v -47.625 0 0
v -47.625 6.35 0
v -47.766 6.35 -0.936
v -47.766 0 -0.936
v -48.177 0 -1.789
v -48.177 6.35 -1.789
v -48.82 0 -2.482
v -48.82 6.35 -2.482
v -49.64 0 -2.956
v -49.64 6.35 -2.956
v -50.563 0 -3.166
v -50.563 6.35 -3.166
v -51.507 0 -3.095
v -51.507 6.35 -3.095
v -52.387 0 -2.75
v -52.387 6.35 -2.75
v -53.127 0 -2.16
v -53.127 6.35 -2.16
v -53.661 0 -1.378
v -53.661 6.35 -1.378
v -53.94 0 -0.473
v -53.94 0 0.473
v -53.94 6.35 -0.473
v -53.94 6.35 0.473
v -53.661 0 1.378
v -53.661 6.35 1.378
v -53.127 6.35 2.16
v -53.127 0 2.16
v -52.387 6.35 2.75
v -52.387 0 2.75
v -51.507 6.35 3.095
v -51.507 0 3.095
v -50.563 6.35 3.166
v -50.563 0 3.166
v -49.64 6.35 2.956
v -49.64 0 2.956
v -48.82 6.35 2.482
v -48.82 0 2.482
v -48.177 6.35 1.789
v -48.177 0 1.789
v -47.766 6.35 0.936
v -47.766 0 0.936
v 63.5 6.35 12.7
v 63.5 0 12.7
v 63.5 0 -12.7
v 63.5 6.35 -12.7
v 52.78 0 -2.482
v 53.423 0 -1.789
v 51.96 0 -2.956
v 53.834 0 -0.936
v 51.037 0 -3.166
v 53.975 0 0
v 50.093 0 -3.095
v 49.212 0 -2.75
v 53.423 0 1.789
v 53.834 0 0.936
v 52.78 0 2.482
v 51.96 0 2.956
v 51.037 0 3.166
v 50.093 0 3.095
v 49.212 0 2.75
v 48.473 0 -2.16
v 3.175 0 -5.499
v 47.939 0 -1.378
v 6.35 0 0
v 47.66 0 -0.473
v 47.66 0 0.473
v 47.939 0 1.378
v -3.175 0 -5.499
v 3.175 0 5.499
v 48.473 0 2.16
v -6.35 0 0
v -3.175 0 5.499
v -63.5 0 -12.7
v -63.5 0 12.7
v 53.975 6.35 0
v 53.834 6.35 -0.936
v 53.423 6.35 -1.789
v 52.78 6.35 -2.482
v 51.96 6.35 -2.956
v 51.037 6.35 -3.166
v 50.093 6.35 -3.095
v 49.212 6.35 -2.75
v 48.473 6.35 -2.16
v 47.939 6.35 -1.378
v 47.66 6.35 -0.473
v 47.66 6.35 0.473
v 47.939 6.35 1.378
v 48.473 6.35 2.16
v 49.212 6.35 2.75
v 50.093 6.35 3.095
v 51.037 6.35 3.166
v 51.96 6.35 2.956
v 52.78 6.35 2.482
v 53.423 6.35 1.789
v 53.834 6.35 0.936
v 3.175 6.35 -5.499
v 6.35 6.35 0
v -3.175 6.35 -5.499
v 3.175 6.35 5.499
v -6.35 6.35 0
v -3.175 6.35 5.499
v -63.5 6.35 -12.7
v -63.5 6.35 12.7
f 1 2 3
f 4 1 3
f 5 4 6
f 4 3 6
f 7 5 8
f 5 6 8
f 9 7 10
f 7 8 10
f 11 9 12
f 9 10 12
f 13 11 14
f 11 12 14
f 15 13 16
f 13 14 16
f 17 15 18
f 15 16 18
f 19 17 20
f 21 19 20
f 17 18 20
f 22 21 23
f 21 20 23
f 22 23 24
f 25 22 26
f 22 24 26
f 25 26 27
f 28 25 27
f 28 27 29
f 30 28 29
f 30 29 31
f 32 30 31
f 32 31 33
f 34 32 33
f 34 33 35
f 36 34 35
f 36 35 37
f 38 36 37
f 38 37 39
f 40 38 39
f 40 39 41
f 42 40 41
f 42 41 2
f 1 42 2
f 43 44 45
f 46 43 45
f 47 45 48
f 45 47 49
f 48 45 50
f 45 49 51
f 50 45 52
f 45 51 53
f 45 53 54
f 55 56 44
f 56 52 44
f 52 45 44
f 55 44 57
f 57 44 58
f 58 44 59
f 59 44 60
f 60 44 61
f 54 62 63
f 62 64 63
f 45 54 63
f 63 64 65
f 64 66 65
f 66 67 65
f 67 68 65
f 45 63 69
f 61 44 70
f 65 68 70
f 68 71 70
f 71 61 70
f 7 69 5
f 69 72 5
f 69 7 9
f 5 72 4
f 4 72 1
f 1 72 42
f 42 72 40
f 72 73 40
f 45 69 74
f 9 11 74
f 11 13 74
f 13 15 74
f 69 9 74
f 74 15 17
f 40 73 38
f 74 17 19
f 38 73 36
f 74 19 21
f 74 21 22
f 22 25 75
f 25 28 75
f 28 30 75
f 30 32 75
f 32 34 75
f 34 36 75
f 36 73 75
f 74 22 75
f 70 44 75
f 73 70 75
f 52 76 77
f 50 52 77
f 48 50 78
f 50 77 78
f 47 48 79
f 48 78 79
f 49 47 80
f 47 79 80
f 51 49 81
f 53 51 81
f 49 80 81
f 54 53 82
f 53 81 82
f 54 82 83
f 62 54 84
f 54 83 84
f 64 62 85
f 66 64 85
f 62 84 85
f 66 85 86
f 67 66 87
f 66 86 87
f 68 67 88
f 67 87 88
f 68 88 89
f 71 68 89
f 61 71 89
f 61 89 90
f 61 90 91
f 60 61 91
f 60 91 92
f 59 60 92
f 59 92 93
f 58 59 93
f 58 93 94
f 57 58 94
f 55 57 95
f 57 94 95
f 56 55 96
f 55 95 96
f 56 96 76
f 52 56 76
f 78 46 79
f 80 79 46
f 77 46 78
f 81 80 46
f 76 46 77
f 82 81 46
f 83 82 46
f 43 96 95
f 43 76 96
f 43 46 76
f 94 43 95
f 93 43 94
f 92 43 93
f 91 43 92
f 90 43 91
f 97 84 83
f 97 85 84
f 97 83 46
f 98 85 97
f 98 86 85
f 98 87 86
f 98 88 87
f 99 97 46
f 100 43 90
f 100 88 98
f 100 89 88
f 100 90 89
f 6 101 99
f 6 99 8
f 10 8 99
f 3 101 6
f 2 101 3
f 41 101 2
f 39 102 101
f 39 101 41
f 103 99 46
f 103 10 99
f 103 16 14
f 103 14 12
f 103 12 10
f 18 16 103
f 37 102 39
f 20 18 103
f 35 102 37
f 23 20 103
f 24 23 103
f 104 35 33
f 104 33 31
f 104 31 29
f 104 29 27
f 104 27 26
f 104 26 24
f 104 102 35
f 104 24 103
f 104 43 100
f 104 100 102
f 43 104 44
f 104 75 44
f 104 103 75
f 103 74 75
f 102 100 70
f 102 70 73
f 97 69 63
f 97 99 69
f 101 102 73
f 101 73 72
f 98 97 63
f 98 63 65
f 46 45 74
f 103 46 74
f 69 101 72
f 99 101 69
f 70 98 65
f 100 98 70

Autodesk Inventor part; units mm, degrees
ref_plane "YZ Plane" through (0, 0, 0) normal (1, 0, 0) x (0, 1, 0)
ref_plane "XZ Plane" through (0, 0, 0) normal (0, 1, 0) x (-1, 0, 0)
ref_plane "XY Plane" through (0, 0, 0) normal (0, 0, 1) x (1, 0, 0)
sketch "Sketch1" plane through (0, 0, 0) normal (0, 1, 0) x (-1, 0, 0)
  line L0 (-63.5, -12.7) -> (63.5, -12.7)
  line L1 (63.5, -12.7) -> (63.5, 12.7)
  line L2 (63.5, 12.7) -> (-63.5, 12.7)
  line L3 (-63.5, 12.7) -> (-63.5, -12.7)
  line L4 (-63.5, -12.7) -> (63.5, 12.7) construction
  line L5 (63.5, -12.7) -> (-63.5, 12.7) construction
  point P0 (0, 0)
  dimension "d0" = 127
  dimension "d1" = 25.4
extrude "Extrusion1" add sketch "Sketch1" along normal blind 6.35
sketch "Sketch2" plane through (0, 6.35, 0) normal (0, 1, 0) x (1, 0, 0)
  line L0 (-63.5, 12.7) -> (-63.5, -12.7) projected
  line L1 (63.5, -12.7) -> (63.5, 12.7) projected
  line L2 (-63.5, 0) -> (-50.8, 0)
  line L3 (-63.5, 0) -> (-50.8, 0) construction
  line L4 (63.5, 0) -> (50.8, 0)
  line L5 (63.5, 0) -> (76.2, 0) construction
  circle A0 centre (-50.8, 0) radius 3.175
  circle A1 centre (50.8, 0) radius 3.175
  point P0 (0, 0)
  dimension "d4" = 12.7
  dimension "d5" = 0
  dimension "d6" = 12.7
  dimension "d7" = 180
  dimension "d8" = 6.35
  dimension "d9" = 6.35
extrude "Extrusion2" cut sketch "Sketch2" against normal blind 6.35
sketch "Sketch3" plane through (0, 6.35, 0) normal (0, 1, 0) x (1, 0, 0)
  circle A0 centre (0, 0) radius 6.35
  line L0 (-6.35, 0) -> (-3.175, 5.4993)
  line L1 (-3.175, 5.4993) -> (3.175, 5.4993)
  line L2 (3.175, 5.4993) -> (6.35, 0)
  line L3 (6.35, 0) -> (3.175, -5.4993)
  line L4 (3.175, -5.4993) -> (-3.175, -5.4993)
  line L5 (-3.175, -5.4993) -> (-6.35, 0)
  dimension "d12" = 12.7
extrude "Extrusion3" cut sketch "Sketch3" against normal blind 25.4 contours L3 L4 L5 L0 L1 L2
properties part number "ArmPlate"
